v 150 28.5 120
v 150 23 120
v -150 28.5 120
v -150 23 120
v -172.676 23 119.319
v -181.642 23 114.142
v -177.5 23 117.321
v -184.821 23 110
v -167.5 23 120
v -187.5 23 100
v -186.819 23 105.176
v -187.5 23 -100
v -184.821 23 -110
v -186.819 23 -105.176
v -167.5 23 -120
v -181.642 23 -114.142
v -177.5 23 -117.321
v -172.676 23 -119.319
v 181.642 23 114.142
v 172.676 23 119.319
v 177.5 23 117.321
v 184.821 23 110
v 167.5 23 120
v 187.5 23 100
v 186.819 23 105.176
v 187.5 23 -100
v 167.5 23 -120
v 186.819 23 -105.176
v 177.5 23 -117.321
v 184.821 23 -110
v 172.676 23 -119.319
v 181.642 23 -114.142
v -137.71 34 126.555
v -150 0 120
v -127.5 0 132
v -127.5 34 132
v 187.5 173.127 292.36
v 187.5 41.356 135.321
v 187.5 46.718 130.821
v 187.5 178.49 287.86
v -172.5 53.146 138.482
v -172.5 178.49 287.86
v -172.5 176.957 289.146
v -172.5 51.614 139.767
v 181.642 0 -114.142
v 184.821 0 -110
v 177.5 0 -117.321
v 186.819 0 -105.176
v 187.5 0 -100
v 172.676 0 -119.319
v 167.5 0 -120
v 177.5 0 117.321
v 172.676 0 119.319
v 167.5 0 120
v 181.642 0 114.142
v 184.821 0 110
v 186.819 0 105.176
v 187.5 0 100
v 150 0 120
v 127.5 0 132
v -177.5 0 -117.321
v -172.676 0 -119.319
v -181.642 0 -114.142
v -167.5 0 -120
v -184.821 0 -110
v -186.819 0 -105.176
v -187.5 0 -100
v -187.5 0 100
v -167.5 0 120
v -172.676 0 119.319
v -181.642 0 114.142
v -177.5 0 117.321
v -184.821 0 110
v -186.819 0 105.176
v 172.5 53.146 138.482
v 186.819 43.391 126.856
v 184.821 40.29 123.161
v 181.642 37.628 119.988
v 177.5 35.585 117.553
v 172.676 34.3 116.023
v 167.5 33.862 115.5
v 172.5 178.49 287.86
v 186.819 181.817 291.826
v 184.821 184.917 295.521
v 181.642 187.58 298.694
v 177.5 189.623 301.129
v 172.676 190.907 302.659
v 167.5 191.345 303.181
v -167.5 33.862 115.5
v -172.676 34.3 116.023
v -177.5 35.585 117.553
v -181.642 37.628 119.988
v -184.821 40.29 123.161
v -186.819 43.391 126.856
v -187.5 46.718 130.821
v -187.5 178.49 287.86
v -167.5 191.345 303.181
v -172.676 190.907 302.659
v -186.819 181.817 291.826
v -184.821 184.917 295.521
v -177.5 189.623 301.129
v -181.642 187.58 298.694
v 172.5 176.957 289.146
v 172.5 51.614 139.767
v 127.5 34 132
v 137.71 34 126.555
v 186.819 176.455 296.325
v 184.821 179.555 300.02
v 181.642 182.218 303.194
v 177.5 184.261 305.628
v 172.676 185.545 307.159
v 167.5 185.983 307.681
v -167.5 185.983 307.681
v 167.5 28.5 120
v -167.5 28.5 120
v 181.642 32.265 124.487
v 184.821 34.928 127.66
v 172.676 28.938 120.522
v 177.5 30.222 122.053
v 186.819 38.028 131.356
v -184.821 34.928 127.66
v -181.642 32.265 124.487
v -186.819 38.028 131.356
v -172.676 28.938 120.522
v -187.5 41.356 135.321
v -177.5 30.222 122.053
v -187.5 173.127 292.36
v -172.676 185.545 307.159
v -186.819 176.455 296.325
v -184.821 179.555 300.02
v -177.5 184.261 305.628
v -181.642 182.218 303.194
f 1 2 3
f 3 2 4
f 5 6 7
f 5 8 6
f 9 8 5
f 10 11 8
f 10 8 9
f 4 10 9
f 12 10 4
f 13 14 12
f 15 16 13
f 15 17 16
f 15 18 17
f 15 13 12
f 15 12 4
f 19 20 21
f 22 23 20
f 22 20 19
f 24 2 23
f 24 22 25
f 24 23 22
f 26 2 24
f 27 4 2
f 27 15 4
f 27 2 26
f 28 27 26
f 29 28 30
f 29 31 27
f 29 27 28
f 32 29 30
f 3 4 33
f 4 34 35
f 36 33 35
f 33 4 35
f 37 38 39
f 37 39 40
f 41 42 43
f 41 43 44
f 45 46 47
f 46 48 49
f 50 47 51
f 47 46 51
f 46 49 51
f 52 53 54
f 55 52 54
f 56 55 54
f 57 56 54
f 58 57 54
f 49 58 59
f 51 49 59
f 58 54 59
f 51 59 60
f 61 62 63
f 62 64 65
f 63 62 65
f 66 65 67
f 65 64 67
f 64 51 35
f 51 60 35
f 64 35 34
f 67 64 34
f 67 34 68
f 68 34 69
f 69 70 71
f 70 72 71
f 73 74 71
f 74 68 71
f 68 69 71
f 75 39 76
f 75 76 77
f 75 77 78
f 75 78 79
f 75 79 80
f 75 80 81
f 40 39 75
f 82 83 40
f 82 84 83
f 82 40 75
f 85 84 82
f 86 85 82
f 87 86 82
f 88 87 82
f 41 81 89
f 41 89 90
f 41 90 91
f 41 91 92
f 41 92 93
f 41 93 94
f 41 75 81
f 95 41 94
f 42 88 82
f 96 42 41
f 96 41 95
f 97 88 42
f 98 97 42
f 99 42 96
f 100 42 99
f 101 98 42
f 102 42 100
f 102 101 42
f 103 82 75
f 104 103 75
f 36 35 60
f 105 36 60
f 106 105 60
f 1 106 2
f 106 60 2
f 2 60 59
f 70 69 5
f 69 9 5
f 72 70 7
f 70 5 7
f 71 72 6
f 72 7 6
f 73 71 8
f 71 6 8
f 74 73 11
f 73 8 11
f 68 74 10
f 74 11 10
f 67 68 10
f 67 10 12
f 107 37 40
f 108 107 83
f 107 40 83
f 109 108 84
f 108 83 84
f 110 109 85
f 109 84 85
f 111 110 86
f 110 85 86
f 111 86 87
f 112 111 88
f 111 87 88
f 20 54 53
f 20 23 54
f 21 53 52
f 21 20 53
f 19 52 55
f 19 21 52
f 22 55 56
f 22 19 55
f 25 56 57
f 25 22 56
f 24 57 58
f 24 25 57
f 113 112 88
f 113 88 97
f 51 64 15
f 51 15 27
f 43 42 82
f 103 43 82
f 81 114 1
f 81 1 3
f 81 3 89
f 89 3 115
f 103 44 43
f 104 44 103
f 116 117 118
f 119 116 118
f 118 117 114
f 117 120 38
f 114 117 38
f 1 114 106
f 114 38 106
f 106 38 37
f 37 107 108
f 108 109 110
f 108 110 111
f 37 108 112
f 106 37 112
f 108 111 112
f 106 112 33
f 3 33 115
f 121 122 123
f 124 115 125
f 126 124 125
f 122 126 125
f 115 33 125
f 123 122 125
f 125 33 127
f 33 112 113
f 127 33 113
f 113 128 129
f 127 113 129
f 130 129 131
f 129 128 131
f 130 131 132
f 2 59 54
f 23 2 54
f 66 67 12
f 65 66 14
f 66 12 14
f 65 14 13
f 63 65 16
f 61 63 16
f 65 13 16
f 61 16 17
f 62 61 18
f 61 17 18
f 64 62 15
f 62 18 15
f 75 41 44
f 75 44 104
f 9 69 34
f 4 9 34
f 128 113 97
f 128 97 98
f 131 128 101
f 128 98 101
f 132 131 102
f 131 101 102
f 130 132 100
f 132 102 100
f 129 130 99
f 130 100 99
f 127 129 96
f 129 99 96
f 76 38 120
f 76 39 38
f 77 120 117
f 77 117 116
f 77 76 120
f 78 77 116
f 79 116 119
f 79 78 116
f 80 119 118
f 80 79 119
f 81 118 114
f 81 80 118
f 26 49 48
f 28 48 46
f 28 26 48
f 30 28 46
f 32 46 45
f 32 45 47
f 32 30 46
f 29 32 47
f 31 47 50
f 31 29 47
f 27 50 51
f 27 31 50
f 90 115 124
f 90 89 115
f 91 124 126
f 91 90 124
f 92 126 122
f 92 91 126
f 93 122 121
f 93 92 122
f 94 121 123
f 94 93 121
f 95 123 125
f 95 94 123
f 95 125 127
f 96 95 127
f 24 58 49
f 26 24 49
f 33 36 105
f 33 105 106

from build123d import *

# Parameters (mm, degrees)
SKETCH1_W           = 375
SKETCH1_H           = 240
BOSS_EXTRUDE1_DEPTH = 23
BOSS_EXTRUDE2_DEPTH = 34
CUT_EXTRUDE1_DEPTH  = 376
SKETCH5_W           = 375
SKETCH5_H           = 245
BOSS_EXTRUDE3_DEPTH = 7
SKETCH6_W           = 345
SKETCH6_H           = 195
CUT_EXTRUDE2_DEPTH  = 2
FILLET1_R           = 20


with BuildPart() as part:
    # Sketch1 → Boss-Extrude1 (new body)
    with BuildSketch(Plane(origin=(0, 0, 0), x_dir=(1, 0, 0), z_dir=(0, 1, 0))):
        Rectangle(SKETCH1_W, SKETCH1_H)
    extrude(amount=BOSS_EXTRUDE1_DEPTH)

    # Sketch3 → Boss-Extrude2 (add)
    with BuildSketch(Plane.XZ):
        Polygon((-150, 120), (-127.5, 132), (127.5, 132), (150, 120), align=None)
    extrude(amount=-BOSS_EXTRUDE2_DEPTH)

    # Sketch4 → Cut-Extrude1 (cut, through all)
    with BuildSketch(Plane.ZY.offset(187.5)):
        Polygon((120, 28.5), (126.554644759, 34), (120, 34), align=None)
    extrude(amount=-CUT_EXTRUDE1_DEPTH, mode=Mode.SUBTRACT)

    # Sketch5 → Boss-Extrude3 (add)
    with BuildSketch(Plane(origin=(0, -42.363978649, 35.54759886), x_dir=(-1, 0, 0), z_dir=(0, 0.766044443, -0.64278761))):
        with Locations((0, 232.74478005)):
            Rectangle(SKETCH5_W, SKETCH5_H)
    extrude(amount=BOSS_EXTRUDE3_DEPTH)

    # Sketch6 → Cut-Extrude2 (cut)
    with BuildSketch(Plane(origin=(0, -37.001667547, 31.048085592), x_dir=(1, 0, 0), z_dir=(0, 0.766044443, -0.64278761))):
        with Locations((0, -237.74478005)):
            Rectangle(SKETCH6_W, SKETCH6_H)
    extrude(amount=-CUT_EXTRUDE2_DEPTH, mode=Mode.SUBTRACT)

    # Fillet1
    fillet1_edges = [part.edges().sort_by_distance(p)[0] for p in [
        (187.5, 188.664119924, 305.43113193),
        (187.5, 31.181155551, 117.750243366),
        (-187.5, 31.181155551, 117.750243366),
        (-187.5, 188.664119924, 305.43113193),
        (-187.5, 11.5, -120),
        (187.5, 11.5, -120),
        (187.5, 11.5, 120),
        (-187.5, 11.5, 120),
    ]]
    fillet(fillet1_edges, radius=FILLET1_R)


solid = part.part
